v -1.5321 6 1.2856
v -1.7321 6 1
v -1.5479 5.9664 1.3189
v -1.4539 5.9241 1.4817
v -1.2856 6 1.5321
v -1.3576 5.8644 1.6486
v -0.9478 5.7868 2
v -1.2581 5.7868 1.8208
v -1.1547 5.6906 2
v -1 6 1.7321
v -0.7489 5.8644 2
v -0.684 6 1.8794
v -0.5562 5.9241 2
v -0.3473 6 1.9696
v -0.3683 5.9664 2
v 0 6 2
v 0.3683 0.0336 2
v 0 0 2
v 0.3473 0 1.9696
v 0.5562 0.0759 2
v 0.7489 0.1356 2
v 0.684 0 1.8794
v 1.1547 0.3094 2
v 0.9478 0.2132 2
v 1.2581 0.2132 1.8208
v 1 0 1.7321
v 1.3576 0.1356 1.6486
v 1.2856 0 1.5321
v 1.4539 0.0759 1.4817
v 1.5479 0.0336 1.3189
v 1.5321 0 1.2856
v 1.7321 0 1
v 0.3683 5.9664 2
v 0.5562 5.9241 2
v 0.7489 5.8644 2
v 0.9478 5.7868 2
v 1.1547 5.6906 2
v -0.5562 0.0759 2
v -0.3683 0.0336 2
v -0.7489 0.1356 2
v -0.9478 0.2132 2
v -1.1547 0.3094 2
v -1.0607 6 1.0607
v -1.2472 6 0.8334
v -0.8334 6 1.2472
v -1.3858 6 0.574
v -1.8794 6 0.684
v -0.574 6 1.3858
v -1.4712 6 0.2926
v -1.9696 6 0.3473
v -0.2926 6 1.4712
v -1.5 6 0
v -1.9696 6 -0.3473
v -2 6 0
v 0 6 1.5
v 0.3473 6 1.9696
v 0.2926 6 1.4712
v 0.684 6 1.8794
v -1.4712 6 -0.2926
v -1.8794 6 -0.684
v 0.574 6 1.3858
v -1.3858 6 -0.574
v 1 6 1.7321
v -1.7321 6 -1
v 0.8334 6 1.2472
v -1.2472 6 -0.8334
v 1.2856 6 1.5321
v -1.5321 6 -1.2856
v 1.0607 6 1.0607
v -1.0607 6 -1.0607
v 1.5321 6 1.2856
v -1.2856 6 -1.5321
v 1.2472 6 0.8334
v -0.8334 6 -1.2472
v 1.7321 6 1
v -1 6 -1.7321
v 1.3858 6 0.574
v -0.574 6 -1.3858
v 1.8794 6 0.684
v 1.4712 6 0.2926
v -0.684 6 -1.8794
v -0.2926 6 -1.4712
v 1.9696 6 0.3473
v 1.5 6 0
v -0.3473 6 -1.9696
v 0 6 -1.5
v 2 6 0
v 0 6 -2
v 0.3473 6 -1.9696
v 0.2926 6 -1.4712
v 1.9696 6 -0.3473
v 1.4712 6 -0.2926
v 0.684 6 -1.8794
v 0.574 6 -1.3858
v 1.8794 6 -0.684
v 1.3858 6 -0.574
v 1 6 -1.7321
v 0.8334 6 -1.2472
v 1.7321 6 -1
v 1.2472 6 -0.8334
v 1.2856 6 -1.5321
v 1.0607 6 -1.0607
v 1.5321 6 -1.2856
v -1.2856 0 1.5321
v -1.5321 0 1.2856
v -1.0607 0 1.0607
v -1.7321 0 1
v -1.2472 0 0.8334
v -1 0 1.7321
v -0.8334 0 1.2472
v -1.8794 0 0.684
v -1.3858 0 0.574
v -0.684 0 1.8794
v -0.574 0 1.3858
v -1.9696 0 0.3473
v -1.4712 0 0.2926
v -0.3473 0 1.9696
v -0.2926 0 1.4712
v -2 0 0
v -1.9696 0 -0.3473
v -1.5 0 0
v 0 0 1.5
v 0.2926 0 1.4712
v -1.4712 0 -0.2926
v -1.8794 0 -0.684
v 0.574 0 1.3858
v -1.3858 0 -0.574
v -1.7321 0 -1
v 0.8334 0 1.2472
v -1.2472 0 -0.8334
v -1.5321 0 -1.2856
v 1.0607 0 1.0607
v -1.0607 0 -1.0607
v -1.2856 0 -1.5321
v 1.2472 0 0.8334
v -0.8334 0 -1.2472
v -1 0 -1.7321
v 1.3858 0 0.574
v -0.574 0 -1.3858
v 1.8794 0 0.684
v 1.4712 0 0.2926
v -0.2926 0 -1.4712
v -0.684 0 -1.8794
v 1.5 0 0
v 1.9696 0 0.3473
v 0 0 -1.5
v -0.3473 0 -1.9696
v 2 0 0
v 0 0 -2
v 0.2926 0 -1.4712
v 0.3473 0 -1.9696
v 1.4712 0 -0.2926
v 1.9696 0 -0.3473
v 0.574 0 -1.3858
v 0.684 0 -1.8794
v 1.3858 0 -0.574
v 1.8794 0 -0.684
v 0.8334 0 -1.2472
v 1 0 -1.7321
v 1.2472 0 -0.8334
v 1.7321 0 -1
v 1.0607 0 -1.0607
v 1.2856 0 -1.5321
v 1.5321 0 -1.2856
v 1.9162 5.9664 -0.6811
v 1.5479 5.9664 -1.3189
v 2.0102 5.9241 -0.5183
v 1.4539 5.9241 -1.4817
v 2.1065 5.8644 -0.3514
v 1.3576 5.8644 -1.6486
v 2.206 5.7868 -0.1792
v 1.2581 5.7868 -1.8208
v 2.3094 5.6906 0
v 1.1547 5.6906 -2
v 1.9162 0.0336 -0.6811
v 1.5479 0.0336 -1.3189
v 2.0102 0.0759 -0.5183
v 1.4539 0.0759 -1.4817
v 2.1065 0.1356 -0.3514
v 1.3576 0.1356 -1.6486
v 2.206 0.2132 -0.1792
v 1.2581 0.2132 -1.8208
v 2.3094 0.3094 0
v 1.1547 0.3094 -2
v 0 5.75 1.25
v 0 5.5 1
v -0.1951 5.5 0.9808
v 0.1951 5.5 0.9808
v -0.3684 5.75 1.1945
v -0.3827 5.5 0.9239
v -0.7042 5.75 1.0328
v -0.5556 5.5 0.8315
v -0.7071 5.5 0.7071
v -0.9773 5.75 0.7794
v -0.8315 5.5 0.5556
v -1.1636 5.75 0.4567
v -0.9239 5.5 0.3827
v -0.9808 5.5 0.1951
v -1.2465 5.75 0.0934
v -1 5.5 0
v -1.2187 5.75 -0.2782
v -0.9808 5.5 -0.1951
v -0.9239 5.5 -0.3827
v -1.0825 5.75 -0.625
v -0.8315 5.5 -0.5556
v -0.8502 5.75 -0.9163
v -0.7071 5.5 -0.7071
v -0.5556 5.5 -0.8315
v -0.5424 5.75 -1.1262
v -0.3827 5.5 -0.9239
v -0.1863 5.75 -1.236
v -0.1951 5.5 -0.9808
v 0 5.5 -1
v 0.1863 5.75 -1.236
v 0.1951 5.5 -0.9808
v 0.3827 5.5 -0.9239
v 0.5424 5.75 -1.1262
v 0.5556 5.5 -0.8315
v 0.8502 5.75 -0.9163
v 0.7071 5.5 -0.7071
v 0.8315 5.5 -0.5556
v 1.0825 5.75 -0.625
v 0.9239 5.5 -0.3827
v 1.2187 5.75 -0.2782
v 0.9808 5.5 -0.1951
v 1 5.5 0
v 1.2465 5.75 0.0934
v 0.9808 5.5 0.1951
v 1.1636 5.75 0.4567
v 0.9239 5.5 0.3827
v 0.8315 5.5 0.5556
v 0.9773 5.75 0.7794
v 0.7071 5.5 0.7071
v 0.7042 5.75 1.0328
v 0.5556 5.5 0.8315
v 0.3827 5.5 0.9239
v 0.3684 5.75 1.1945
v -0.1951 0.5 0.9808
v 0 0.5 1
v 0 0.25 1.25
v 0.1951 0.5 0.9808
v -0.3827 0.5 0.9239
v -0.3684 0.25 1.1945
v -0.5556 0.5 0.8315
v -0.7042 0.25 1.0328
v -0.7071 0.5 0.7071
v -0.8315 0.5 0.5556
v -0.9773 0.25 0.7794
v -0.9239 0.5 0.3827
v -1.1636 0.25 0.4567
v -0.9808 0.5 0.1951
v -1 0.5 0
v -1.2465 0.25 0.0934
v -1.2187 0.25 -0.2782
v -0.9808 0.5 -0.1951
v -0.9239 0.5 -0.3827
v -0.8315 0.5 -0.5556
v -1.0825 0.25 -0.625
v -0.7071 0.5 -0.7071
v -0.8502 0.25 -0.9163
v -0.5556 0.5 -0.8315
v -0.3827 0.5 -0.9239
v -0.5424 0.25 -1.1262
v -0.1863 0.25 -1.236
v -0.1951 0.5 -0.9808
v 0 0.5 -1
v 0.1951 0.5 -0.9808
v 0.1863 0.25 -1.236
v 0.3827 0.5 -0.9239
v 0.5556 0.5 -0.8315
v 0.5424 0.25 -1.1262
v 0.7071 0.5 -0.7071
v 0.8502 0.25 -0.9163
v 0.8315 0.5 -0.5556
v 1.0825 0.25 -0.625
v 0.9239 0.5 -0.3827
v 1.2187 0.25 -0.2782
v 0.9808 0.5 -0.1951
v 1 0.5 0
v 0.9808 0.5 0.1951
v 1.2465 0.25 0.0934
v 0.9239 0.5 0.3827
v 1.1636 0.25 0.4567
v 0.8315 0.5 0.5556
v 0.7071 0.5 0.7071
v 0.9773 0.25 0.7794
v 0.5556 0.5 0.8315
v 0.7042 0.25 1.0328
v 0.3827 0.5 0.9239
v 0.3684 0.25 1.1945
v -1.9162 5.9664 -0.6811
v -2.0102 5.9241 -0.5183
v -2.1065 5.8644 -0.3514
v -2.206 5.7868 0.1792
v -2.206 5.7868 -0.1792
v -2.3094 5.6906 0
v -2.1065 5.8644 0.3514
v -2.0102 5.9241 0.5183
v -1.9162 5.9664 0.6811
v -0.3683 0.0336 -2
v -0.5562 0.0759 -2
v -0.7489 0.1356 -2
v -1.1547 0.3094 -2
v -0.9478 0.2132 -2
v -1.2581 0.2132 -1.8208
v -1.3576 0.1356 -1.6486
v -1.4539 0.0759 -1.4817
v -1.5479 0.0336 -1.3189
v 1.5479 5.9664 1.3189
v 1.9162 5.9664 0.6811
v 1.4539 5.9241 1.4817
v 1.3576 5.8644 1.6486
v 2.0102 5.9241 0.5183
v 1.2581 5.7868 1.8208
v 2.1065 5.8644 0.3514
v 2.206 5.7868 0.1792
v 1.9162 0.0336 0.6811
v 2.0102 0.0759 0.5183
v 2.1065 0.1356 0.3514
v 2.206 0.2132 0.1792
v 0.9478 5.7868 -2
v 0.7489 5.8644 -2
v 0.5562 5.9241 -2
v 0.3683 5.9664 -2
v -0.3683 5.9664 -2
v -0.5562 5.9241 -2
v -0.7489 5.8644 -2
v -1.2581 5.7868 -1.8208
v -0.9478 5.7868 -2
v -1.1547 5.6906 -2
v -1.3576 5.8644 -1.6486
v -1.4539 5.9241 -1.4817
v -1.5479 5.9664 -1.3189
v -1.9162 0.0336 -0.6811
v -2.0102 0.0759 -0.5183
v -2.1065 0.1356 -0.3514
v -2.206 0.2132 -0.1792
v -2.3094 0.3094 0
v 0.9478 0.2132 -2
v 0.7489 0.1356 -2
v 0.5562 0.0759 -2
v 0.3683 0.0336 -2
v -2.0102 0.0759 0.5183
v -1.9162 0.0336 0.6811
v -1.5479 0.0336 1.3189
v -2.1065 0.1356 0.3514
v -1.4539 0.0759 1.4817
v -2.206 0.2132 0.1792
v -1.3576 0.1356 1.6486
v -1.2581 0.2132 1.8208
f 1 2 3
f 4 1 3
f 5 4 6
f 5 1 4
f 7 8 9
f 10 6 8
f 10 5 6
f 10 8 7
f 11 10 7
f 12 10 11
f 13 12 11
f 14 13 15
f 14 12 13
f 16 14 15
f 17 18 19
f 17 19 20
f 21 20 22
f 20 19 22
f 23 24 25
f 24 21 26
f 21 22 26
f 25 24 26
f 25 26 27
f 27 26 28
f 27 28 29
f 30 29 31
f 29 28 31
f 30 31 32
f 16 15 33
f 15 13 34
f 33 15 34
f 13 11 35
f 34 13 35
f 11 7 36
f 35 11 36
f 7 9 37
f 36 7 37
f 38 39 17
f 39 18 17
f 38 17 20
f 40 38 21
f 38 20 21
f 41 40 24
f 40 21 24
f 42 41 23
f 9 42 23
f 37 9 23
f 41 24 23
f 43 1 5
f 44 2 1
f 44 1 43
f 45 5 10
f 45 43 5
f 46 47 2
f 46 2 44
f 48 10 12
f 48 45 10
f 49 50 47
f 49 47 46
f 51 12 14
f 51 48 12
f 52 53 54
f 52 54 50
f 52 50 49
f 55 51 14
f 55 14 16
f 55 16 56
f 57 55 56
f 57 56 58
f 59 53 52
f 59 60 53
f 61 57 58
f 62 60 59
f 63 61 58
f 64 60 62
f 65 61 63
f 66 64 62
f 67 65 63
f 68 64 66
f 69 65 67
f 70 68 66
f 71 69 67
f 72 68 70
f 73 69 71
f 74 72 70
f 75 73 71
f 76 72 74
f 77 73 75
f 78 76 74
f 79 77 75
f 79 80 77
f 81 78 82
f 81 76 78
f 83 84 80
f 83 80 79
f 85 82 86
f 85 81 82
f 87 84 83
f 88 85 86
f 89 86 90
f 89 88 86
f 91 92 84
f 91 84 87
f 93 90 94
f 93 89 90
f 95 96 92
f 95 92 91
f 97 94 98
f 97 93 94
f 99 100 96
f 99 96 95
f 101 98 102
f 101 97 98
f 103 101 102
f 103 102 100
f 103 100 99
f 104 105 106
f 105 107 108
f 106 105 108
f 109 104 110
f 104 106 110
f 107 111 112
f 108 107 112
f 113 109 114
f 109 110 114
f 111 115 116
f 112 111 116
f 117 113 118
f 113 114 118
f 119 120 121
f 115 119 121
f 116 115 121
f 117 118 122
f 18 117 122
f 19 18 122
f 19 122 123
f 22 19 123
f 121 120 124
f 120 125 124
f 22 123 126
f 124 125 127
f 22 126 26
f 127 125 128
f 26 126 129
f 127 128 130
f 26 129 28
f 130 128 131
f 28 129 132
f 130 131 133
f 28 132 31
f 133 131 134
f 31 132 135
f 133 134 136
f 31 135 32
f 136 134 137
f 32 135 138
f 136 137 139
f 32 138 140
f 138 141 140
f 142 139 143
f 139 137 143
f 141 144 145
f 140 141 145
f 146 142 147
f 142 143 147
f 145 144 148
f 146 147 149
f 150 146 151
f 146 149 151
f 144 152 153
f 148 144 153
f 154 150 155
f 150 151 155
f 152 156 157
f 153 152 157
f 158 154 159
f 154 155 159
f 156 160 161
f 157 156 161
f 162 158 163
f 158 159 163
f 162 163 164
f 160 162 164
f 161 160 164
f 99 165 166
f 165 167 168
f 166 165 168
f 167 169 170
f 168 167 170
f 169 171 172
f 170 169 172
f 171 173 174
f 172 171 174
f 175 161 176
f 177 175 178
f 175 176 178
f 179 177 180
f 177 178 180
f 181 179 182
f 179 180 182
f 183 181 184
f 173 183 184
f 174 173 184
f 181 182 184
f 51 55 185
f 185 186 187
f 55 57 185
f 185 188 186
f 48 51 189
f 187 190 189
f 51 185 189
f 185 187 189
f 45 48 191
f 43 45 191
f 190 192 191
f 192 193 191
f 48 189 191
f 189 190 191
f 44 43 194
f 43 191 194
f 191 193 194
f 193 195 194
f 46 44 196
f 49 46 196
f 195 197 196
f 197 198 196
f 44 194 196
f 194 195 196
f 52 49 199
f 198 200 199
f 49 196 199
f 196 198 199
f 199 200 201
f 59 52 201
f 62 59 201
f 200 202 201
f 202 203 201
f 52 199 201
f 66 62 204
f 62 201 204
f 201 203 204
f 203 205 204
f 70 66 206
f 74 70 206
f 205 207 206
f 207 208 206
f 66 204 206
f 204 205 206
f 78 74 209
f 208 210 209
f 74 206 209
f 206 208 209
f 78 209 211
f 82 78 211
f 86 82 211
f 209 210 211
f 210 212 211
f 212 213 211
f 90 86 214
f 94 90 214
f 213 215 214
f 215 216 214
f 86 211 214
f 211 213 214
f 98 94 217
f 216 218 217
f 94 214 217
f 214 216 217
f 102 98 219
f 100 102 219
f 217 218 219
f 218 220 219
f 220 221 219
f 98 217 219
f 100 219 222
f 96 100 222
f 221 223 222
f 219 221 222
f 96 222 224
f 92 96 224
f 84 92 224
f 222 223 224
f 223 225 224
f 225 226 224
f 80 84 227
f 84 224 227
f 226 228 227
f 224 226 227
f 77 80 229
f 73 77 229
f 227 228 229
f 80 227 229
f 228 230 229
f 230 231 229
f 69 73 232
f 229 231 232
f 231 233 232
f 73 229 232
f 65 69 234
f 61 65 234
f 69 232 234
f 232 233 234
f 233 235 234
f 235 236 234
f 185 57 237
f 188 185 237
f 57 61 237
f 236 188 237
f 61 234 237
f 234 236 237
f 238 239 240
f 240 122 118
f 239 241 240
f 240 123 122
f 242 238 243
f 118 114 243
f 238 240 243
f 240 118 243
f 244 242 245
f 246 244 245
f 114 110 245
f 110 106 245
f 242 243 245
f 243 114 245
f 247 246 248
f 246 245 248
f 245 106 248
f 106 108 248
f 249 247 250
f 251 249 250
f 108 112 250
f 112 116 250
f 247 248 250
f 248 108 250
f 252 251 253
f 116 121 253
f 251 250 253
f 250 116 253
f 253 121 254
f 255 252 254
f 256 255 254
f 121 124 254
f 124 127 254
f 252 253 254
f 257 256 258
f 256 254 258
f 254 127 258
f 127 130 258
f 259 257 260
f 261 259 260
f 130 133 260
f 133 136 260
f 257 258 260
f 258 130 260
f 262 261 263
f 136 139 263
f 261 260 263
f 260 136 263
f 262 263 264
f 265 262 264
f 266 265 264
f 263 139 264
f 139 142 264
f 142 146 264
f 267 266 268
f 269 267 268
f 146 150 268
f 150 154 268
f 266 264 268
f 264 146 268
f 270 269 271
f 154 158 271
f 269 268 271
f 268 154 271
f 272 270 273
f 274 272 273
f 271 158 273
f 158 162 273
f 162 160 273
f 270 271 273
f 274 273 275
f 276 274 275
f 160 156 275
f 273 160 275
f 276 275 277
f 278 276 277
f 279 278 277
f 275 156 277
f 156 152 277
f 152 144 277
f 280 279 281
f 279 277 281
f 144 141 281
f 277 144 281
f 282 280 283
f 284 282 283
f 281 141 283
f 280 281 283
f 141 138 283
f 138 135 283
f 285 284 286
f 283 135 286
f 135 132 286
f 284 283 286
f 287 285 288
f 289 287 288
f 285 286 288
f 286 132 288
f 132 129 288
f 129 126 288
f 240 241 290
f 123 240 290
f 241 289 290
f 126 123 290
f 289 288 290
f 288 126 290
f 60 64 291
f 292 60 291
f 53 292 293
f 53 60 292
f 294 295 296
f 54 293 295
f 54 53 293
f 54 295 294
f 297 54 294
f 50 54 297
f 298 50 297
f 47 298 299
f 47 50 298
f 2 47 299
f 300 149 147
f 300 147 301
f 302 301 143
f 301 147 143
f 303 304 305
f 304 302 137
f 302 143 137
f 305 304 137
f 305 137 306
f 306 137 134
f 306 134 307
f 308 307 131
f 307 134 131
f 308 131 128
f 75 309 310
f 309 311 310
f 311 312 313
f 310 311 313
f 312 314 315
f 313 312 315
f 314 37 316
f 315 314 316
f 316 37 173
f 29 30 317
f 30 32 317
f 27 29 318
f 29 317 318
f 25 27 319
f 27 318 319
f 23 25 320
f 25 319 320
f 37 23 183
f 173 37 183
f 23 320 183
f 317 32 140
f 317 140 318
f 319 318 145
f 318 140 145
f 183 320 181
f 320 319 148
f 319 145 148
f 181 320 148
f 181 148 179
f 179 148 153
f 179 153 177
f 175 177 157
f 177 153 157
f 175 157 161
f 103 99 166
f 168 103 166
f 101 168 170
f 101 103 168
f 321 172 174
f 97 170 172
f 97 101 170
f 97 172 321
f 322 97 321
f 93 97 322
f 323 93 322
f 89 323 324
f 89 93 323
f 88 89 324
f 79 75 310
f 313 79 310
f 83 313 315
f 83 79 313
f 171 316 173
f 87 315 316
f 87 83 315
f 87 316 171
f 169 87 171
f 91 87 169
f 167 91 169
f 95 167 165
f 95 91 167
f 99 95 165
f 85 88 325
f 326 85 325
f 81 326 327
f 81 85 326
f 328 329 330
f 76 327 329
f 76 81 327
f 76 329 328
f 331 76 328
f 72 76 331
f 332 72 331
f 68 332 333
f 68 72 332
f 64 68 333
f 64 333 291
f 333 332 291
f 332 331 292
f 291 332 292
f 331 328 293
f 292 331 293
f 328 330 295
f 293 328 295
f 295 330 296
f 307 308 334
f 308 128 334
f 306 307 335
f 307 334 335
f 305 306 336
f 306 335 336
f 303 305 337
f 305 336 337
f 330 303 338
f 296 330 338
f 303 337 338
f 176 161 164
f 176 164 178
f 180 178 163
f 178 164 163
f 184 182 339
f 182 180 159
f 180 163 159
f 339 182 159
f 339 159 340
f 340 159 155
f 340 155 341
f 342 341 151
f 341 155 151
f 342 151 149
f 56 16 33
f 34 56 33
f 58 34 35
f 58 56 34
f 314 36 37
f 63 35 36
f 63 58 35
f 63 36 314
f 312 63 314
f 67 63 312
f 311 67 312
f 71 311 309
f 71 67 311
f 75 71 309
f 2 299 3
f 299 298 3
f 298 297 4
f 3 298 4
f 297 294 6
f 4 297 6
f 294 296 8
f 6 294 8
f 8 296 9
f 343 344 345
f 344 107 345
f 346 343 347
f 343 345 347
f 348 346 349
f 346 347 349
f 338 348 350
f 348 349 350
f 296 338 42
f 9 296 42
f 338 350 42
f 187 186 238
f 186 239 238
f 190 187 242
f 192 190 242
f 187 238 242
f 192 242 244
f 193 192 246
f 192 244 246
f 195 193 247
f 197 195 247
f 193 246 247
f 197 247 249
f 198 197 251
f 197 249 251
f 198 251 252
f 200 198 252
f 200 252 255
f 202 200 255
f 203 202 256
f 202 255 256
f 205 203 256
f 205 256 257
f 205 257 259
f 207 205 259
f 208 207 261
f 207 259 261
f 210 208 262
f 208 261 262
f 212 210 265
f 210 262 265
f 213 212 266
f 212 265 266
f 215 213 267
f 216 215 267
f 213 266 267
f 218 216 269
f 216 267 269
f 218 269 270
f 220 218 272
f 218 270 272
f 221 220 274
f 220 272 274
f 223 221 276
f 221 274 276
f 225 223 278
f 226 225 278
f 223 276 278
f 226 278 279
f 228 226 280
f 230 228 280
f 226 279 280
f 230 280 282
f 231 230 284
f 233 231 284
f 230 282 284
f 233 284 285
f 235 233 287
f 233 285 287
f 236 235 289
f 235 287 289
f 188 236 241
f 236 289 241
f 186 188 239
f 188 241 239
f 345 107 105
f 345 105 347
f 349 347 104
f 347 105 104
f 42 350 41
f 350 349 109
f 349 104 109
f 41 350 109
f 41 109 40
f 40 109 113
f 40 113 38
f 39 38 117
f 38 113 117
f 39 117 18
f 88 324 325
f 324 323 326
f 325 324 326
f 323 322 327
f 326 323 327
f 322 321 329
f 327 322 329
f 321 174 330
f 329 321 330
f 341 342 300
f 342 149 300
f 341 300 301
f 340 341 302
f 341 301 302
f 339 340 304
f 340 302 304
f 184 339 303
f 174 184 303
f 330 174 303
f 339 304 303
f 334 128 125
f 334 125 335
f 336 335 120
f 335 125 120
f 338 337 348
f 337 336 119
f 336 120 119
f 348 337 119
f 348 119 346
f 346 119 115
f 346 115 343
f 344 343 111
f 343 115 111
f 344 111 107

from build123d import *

# Parameters (mm, degrees)
EXTRUDE1_DEPTH = 6


with BuildPart() as part:
    # Sketch1 → Extrude1 (new body)
    with BuildSketch(Plane(origin=(0, 0, 0), x_dir=(1, 0, 0), z_dir=(0, 1, 0))):
        Polygon((1.154700538, 2), (-1.154700538, 2), (-2.309401077, 0), (-1.154700538, -2), (1.154700538, -2), (2.309401077, 0), align=None)
    extrude(amount=EXTRUDE1_DEPTH)

    # Sketch3 → Cut-Revolve1 (revolve, cut)
    with BuildSketch(Plane(origin=(0, 0, 0), x_dir=(0, 0, -1), z_dir=(1, 0, 0)), mode=Mode.PRIVATE) as cut_revolve1_sk:
        Polygon((1.5, 6), (1, 5.5), (1, 0.5), (1.5, 0), (0, 0), (0, 6), align=None)
    revolve(cut_revolve1_sk.sketch.rotate(Axis((0, 6, 0), (0, -1, 0)), 180), axis=Axis((0, 6, 0), (0, -1, 0)), mode=Mode.SUBTRACT)

    # Sketch4 → Cut-Revolve3 (revolve, cut)
    with BuildSketch(Plane(origin=(0, 0, 0), x_dir=(0, 0, -1), z_dir=(1, 0, 0))):
        Polygon((2, 6), (4.5, 6), (4.5, 3.5), align=None)
        Polygon((2, 0), (4.5, 0), (4.5, 2.5), align=None)
    revolve(axis=Axis((0, 0, 0), (0, 1, 0)), mode=Mode.SUBTRACT)


solid = part.part
